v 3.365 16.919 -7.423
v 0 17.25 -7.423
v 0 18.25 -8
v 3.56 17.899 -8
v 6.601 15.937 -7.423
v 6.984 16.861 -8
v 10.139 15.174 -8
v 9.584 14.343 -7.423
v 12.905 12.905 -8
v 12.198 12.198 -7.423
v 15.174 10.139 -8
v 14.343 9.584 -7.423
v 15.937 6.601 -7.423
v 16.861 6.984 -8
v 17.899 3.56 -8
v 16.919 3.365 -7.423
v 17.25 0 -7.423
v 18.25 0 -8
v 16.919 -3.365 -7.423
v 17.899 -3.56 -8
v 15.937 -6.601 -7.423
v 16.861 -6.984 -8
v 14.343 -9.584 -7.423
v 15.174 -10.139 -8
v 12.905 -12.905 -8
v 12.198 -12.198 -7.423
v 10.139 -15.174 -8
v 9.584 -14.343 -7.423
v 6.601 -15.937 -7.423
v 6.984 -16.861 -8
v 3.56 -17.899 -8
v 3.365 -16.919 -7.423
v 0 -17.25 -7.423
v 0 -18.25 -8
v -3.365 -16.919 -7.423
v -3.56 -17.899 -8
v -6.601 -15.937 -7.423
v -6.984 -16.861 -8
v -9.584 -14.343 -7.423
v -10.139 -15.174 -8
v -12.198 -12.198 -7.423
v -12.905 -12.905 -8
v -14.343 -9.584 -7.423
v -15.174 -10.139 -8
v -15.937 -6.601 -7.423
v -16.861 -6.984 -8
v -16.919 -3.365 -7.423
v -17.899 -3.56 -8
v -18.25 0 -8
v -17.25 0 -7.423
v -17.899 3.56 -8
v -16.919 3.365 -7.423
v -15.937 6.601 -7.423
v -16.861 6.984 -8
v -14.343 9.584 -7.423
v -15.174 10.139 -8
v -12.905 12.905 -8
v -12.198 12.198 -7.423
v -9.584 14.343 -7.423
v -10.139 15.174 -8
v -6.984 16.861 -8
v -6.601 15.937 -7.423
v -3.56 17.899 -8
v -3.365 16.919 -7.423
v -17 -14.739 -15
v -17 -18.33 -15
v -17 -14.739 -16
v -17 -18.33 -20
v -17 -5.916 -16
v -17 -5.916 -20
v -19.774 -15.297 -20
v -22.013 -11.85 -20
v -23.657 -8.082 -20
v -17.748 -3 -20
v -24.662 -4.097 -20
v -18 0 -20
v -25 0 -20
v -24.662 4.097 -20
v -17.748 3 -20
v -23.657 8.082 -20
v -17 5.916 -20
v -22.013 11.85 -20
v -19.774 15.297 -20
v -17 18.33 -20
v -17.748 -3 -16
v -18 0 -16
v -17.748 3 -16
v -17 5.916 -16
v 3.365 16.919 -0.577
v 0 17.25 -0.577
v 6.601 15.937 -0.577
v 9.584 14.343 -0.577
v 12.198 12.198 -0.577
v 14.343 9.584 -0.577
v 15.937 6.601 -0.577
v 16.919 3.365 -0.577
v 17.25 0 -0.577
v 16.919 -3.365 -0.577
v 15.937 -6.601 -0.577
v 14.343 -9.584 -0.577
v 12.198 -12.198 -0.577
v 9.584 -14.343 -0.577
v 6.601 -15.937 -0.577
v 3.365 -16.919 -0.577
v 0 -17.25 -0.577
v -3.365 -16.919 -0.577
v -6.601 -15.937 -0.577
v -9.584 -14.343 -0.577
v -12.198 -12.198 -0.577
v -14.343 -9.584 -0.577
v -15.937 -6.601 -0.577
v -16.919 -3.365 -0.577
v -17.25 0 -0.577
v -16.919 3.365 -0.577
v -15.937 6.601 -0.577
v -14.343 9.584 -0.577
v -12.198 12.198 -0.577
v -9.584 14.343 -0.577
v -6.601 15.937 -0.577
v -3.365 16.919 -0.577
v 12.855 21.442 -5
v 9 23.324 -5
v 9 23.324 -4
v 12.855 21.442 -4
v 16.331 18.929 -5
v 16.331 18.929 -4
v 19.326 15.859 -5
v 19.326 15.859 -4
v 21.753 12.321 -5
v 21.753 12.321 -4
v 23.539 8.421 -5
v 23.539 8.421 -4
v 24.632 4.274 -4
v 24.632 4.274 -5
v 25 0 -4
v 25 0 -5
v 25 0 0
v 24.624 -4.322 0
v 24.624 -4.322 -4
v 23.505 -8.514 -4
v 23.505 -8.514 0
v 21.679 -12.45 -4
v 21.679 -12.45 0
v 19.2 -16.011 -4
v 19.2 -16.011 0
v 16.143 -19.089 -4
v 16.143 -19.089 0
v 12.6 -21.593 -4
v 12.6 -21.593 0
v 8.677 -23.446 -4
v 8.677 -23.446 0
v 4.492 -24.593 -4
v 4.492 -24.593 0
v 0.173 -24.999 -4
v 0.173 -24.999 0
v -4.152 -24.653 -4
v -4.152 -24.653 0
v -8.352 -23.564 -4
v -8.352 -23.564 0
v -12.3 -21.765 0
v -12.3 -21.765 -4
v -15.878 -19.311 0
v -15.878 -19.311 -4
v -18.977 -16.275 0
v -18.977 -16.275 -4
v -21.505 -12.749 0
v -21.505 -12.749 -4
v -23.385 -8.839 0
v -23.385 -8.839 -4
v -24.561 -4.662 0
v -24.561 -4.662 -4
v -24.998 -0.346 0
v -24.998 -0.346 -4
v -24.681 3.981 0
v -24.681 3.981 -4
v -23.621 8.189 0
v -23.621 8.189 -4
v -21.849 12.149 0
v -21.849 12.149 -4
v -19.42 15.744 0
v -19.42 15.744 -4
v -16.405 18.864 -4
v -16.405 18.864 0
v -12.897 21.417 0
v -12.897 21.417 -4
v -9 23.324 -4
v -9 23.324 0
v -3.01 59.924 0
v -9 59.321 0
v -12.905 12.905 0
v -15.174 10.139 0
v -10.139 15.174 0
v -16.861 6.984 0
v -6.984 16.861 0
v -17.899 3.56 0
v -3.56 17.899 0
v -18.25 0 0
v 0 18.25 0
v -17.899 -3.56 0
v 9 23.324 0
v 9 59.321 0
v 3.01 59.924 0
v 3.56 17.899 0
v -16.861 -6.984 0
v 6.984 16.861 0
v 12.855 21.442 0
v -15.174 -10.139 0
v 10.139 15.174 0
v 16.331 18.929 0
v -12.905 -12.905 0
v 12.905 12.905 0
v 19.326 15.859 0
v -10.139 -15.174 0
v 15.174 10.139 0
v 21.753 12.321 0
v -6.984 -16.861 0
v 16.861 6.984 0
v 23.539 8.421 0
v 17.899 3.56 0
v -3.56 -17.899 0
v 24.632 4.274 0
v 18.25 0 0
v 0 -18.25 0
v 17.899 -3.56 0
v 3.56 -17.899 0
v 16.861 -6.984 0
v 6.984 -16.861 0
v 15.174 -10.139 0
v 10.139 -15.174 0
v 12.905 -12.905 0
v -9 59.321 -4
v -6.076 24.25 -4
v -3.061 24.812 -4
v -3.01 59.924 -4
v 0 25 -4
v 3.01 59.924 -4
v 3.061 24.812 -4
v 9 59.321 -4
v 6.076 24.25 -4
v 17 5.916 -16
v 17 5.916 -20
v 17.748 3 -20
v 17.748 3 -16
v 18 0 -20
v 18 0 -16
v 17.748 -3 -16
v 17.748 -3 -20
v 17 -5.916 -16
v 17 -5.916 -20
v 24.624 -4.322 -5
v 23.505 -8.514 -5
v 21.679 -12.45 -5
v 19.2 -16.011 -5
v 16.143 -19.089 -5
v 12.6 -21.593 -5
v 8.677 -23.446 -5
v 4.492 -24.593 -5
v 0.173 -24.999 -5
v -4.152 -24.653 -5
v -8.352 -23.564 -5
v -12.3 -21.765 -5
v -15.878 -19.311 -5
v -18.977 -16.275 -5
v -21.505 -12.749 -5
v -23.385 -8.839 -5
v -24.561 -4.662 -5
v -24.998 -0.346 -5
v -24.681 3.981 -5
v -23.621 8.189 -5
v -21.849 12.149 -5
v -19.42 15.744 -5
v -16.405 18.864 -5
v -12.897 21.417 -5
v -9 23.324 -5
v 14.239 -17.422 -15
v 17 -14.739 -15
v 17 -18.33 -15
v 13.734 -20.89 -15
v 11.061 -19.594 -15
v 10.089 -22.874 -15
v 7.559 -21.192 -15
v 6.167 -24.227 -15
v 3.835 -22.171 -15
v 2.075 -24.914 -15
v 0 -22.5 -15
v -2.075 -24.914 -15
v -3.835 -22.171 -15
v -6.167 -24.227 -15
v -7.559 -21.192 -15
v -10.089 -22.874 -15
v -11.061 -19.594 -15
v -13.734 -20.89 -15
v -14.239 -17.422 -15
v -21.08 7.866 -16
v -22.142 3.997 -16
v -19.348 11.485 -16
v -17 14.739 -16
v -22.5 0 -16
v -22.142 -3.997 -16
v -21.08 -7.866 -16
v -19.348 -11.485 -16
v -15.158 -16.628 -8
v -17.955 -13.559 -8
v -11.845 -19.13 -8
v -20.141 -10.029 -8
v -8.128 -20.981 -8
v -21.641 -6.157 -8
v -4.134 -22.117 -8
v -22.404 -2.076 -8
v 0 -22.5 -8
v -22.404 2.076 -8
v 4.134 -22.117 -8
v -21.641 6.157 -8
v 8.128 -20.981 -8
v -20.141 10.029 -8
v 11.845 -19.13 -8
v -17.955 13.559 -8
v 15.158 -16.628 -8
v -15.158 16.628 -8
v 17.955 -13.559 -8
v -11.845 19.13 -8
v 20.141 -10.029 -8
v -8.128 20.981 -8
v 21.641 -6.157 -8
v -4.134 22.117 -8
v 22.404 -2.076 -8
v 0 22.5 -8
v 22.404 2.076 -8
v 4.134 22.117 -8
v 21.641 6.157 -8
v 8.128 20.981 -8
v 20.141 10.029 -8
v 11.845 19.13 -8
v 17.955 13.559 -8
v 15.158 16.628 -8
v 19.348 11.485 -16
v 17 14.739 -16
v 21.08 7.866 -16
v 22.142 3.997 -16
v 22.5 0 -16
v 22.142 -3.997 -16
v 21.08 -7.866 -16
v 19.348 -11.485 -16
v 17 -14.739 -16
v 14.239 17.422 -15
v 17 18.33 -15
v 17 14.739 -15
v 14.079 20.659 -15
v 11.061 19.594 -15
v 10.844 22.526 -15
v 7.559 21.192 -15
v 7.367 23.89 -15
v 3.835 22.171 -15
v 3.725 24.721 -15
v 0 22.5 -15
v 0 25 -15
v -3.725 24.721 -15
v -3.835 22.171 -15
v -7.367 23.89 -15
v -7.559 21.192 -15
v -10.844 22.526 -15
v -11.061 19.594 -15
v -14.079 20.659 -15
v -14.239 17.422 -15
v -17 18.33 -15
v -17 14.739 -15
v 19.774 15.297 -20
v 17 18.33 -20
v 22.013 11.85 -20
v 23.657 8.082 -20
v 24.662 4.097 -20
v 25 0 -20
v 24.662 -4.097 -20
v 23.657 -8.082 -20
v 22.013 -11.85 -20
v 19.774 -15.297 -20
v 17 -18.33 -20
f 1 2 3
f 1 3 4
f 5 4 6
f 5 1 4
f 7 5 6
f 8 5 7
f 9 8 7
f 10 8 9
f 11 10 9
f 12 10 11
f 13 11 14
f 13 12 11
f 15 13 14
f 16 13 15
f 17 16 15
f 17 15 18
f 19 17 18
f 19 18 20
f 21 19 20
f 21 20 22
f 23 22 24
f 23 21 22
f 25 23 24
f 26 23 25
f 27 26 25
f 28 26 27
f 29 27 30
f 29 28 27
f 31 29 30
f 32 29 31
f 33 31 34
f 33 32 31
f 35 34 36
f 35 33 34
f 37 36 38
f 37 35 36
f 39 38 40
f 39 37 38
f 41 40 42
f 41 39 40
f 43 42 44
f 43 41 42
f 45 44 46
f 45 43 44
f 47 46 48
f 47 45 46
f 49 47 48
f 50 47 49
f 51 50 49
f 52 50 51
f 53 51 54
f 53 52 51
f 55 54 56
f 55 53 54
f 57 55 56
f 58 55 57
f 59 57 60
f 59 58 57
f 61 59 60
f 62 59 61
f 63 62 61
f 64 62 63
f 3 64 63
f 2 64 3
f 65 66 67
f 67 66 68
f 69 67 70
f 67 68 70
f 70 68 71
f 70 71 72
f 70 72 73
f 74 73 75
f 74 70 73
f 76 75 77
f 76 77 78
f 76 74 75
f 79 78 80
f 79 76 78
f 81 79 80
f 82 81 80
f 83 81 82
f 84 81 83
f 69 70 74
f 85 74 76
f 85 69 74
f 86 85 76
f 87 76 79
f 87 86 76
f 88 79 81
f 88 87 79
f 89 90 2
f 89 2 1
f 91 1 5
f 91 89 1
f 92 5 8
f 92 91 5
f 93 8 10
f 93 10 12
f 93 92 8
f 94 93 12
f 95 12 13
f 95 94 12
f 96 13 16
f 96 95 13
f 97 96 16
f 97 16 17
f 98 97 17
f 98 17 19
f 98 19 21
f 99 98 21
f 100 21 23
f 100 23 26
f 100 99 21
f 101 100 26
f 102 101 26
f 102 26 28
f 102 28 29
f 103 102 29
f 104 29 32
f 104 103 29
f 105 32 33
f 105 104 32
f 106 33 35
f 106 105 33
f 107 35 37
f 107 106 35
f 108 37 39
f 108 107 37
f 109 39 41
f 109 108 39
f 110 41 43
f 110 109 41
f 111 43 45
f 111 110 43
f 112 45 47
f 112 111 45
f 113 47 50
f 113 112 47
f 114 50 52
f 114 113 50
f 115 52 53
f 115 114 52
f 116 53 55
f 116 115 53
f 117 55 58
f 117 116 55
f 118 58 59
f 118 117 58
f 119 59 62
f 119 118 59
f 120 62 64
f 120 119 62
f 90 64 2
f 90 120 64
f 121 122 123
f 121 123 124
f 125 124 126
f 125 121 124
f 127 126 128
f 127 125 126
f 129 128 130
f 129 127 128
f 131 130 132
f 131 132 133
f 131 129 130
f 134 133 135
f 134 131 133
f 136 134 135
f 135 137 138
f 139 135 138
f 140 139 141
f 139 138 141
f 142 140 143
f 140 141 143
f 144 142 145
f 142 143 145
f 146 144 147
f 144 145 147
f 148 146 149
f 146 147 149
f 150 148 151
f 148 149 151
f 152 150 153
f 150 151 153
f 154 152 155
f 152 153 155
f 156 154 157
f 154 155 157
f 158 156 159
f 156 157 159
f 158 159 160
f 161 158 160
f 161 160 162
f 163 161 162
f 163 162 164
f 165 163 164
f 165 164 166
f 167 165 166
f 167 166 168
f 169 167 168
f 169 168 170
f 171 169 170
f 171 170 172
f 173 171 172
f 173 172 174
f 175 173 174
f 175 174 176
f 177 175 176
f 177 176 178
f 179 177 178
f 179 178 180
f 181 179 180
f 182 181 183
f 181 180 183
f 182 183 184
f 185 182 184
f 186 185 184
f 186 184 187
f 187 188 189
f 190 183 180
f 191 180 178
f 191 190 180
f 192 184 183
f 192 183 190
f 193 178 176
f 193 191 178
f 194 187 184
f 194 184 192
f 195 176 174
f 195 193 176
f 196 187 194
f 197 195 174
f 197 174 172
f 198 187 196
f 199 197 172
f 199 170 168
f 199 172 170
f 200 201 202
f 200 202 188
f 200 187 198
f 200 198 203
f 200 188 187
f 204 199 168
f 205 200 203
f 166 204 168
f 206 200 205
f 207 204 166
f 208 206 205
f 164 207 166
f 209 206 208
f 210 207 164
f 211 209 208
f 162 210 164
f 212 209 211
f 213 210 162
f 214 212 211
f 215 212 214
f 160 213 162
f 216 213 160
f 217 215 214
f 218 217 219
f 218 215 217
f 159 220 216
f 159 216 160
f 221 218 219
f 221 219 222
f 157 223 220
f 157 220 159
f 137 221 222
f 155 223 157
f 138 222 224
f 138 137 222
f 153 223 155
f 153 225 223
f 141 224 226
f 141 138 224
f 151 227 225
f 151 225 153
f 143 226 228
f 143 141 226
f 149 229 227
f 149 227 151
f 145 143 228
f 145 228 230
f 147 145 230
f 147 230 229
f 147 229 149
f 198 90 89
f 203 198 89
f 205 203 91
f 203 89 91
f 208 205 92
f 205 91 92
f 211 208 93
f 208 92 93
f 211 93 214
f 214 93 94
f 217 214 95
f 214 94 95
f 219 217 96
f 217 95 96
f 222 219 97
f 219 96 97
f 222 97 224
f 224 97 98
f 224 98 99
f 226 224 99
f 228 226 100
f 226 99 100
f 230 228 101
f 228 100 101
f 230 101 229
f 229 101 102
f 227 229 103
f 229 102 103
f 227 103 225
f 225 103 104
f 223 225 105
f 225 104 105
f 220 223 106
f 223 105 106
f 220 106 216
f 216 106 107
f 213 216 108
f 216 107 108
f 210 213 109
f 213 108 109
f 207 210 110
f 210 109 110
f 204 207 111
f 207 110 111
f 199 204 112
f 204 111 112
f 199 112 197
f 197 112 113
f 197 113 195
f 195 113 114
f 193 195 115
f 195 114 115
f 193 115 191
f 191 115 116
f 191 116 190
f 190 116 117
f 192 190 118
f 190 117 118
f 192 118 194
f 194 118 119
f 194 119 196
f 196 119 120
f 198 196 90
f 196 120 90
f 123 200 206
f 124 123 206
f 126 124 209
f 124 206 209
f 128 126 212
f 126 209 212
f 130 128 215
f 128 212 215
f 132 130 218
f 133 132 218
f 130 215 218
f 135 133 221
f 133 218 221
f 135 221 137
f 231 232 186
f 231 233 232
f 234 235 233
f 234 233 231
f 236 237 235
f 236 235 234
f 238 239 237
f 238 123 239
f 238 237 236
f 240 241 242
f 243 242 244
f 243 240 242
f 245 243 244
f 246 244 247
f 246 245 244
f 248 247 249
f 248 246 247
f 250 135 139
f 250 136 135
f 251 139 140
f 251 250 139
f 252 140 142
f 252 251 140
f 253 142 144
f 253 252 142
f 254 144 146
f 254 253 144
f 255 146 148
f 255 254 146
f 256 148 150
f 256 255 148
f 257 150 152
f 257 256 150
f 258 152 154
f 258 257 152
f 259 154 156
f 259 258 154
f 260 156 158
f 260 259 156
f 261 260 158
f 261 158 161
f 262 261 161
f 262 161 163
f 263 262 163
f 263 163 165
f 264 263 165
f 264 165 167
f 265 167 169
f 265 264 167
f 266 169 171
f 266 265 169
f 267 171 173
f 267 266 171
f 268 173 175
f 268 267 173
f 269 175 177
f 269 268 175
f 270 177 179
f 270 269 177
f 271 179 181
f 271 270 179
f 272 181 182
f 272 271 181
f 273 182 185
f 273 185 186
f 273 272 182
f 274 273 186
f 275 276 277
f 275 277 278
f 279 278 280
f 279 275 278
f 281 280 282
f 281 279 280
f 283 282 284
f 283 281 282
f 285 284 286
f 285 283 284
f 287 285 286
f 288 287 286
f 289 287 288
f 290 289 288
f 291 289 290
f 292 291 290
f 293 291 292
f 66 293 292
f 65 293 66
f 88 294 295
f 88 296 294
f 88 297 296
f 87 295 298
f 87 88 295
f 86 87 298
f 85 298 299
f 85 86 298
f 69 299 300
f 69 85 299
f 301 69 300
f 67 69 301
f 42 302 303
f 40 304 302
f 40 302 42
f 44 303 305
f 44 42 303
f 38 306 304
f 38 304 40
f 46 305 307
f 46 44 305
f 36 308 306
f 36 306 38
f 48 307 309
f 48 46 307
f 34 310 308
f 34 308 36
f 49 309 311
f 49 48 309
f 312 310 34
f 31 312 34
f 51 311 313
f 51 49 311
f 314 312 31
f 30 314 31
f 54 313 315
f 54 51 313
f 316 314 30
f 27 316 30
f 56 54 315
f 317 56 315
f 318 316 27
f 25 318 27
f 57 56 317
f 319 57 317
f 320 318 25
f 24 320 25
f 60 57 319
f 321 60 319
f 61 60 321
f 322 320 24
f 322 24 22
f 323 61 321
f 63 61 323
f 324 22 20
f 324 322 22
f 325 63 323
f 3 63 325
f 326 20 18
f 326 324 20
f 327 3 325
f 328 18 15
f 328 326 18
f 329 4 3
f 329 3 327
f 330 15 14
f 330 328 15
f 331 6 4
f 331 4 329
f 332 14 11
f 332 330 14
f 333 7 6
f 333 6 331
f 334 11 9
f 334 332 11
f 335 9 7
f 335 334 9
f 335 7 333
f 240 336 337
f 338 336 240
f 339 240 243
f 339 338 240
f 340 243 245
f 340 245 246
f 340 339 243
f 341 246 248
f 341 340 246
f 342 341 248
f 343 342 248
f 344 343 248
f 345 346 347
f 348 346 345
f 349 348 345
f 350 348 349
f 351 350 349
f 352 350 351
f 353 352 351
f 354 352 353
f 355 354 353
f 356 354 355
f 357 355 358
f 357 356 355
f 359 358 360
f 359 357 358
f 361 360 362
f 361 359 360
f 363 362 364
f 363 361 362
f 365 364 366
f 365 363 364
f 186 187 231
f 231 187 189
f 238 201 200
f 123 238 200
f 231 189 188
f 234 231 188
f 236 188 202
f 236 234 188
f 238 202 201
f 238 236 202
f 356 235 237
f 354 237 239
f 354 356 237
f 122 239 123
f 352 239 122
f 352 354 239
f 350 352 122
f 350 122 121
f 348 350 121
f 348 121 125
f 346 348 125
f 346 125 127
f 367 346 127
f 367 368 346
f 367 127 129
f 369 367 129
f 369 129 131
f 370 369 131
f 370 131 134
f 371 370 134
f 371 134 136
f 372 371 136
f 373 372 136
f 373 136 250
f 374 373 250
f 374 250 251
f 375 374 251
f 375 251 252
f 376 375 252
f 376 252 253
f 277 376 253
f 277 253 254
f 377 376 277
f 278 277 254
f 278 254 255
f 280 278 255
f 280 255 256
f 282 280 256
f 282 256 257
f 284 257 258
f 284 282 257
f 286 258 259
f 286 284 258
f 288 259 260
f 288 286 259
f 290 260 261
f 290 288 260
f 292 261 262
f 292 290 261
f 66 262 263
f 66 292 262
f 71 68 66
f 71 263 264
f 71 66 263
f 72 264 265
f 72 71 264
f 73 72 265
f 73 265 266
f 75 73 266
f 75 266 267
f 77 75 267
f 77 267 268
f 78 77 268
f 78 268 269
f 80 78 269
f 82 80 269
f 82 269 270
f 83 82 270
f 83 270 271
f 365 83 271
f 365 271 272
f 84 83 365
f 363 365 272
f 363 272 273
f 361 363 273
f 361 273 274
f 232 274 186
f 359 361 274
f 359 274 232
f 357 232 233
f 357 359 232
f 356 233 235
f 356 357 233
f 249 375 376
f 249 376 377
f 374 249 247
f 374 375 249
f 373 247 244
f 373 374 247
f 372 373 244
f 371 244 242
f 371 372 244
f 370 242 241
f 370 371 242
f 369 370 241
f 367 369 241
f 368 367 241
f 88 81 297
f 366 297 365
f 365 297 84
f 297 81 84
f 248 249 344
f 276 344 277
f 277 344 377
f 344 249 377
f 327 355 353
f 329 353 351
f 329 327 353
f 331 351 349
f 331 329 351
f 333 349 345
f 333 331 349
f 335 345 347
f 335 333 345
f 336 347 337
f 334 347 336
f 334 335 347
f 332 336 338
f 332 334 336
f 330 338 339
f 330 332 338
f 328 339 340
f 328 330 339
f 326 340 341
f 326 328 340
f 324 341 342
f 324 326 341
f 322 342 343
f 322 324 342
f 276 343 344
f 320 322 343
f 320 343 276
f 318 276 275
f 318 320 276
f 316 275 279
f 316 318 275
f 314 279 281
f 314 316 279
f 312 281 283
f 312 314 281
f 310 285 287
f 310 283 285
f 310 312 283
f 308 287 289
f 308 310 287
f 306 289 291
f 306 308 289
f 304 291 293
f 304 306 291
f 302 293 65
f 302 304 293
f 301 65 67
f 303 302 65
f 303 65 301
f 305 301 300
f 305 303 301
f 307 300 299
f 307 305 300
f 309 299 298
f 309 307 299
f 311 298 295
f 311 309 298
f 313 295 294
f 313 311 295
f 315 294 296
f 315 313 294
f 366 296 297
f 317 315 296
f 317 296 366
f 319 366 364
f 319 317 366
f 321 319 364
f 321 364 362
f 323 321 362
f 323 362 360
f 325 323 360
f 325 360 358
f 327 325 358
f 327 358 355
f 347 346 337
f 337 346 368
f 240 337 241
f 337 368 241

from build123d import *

# Parameters (mm, degrees)
CHAMFER_1_SIZE         = 1
CHAMFER_1_SIZE2        = 0.577350269
CHAMFER_1_PART_2_SIZE  = 1
CHAMFER_1_PART_2_SIZE2 = 0.577350269
CUT_EXTRUDE_1_DEPTH    = 5
CUT_EXTRUDE_2_DEPTH    = 5


with BuildPart() as part:
    # Эскиз1 → Повернуть1 (revolve)
    with BuildSketch(Plane(origin=(0, 0, 0), x_dir=(0, 0, -1), z_dir=(1, 0, 0))):
        Polygon((0, 17.25), (0, 60), (4, 60), (4, 25), (20, 25), (20, 18), (16, 18), (16, 22.5), (8, 22.5), (8, 17.25), align=None)
    revolve(axis=Axis((0, 0, 0), (0, 0, -1)))

    # Фаска1
    chamfer_1_edges = [part.edges().sort_by_distance(p)[0] for p in [
        (0, -17.25, 0),
    ]]
    chamfer_1_side = [part.faces().sort_by_distance(p)[0] for p in [
        (0, -18.947056275, 0),
    ]]
    chamfer(chamfer_1_edges, length=CHAMFER_1_SIZE, length2=CHAMFER_1_SIZE2, reference=chamfer_1_side[0])

    # Фаска1 part 2
    chamfer_1_part_2_edges = [part.edges().sort_by_distance(p)[0] for p in [
        (0, -17.25, -8),
    ]]
    chamfer_1_part_2_side = [part.faces().sort_by_distance(p)[0] for p in [
        (0, -21.863603897, -8),
    ]]
    chamfer(chamfer_1_part_2_edges, length=CHAMFER_1_PART_2_SIZE, length2=CHAMFER_1_PART_2_SIZE2, reference=chamfer_1_part_2_side[0])

    # Эскиз2 → Вырез-Вытянуть1 (cut)
    with BuildSketch(Plane(origin=(0, 0, -20), x_dir=(-1, 0, 0), z_dir=(0, 0, -1))):
        with BuildLine():
            ThreePointArc((17, 18.33030278), (0, 25), (-17, 18.33030278))
            Line((-17, 18.33030278), (-17, 5.916079783))
            ThreePointArc((-17, 5.916079783), (0, 18), (17, 5.916079783))
            Line((17, 5.916079783), (17, 18.33030278))
        make_face()
        with BuildLine():
            Line((-17, -5.916079783), (-17, -18.33030278))
            ThreePointArc((-17, -18.33030278), (0, -25), (17, -18.33030278))
            Line((17, -18.33030278), (17, -5.916079783))
            ThreePointArc((17, -5.916079783), (0, -18), (-17, -5.916079783))
        make_face()
    extrude(amount=-CUT_EXTRUDE_1_DEPTH, mode=Mode.SUBTRACT)

    # Эскиз3 → Вырез-Вытянуть2 (cut)
    with BuildSketch(Plane.XY):
        with BuildLine():
            Line((-9, 23.323807579), (-9, 59.3211598))
            ThreePointArc((-9, 59.3211598), (-39.115214431, -45.497252664), (60, 0))
            ThreePointArc((60, 0), (45.497252664, 39.115214431), (9, 59.3211598))
            Line((9, 59.3211598), (9, 23.323807579))
            ThreePointArc((9, 23.323807579), (20.615528128, 14.142135624), (25, 0))
            ThreePointArc((25, 0), (-14.142135624, -20.615528128), (-9, 23.323807579))
        make_face()
    extrude(amount=-CUT_EXTRUDE_2_DEPTH, mode=Mode.SUBTRACT)


solid = part.part
